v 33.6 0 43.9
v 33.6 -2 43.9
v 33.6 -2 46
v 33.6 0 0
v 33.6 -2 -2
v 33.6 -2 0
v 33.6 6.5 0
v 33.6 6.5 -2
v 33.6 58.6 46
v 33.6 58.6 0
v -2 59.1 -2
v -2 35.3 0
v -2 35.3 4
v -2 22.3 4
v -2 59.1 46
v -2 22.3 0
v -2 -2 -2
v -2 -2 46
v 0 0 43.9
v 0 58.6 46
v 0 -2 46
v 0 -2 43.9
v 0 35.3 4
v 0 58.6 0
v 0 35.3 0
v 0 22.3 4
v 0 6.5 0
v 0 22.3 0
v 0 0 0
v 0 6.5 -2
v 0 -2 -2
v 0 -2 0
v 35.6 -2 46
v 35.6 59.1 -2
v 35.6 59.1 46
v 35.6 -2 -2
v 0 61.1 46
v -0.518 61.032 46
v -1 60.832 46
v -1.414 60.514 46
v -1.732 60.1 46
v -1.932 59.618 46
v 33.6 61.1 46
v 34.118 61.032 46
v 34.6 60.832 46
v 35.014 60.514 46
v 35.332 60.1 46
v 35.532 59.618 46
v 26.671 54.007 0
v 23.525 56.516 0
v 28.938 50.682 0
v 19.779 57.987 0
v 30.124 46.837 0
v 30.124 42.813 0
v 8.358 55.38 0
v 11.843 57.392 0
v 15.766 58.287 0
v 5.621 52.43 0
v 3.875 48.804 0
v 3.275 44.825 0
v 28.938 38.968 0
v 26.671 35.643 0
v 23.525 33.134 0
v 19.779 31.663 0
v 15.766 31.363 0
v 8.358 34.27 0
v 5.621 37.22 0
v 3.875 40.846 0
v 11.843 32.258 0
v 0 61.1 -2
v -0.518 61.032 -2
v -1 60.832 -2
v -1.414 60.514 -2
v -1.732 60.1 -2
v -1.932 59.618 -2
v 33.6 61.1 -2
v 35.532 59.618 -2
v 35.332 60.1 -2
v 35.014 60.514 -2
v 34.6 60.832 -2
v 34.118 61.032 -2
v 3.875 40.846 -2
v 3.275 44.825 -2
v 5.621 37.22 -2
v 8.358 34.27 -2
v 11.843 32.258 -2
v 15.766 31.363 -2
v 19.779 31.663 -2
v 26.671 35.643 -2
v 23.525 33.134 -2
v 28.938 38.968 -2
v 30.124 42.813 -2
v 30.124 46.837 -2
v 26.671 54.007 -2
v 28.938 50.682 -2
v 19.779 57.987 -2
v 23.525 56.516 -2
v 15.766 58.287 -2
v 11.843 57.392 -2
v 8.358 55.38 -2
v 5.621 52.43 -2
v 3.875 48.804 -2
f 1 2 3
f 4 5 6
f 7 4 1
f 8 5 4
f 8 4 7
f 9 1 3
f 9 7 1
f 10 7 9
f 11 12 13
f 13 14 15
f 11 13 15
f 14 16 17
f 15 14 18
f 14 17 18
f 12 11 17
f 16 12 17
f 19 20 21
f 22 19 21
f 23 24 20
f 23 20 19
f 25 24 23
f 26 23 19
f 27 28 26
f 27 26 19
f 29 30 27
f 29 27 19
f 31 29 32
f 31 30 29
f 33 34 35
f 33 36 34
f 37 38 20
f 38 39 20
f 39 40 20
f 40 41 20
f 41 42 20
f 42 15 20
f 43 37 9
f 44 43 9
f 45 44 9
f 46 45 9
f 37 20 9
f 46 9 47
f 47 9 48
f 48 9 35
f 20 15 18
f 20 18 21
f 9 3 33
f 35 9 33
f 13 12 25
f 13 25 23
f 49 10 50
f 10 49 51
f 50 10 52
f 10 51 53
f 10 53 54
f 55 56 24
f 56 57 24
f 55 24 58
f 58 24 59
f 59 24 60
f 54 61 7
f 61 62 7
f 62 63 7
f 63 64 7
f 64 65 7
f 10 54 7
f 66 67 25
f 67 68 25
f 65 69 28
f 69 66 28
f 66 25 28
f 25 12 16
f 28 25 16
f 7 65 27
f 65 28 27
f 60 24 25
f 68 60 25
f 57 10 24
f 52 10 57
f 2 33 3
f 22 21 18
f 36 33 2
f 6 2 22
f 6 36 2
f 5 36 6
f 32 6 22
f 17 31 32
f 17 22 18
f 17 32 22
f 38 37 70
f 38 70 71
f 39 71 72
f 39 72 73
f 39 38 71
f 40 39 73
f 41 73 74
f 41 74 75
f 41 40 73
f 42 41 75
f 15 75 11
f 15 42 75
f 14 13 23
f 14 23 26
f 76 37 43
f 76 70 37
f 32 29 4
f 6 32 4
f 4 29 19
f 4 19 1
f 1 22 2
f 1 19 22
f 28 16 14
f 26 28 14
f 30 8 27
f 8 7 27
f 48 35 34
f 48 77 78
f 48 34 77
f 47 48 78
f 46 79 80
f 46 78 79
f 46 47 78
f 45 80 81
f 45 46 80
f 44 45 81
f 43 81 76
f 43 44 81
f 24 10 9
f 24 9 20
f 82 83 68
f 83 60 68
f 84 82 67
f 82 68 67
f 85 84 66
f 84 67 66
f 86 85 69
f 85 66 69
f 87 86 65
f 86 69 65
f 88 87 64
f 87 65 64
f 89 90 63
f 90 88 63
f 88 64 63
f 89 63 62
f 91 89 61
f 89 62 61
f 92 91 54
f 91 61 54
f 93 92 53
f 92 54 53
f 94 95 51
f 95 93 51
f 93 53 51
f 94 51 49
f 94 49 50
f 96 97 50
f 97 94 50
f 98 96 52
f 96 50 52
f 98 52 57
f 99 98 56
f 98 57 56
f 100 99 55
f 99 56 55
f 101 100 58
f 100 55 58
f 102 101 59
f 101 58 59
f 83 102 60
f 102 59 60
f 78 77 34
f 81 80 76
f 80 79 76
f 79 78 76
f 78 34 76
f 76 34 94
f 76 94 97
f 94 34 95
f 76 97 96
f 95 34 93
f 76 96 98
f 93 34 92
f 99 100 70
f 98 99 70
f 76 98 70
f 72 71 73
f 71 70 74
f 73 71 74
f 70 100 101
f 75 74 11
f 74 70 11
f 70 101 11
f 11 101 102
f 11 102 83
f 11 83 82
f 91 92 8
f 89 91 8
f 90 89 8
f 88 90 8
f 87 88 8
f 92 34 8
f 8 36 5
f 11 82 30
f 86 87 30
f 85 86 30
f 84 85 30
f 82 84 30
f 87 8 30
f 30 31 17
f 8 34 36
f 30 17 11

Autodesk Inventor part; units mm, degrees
ref_plane "YZ Plane" through (0, 0, 0) normal (1, 0, 0) x (0, 1, 0)
ref_plane "XZ Plane" through (0, 0, 0) normal (0, 1, 0) x (-1, 0, 0)
ref_plane "XY Plane" through (0, 0, 0) normal (0, 0, 1) x (1, 0, 0)
sketch "Sketch3" plane through (0, 0, 0) normal (0, 0, 1) x (1, 0, 0)
  line L0 (0, 0) -> (33.6, 0)
  line L1 (33.6, 0) -> (33.6, 58.6)
  line L2 (33.6, 58.6) -> (0, 58.6)
  line L3 (0, 58.6) -> (0, 0)
  line L4 (-2, 60.6) -> (35.6, 60.6)
  line L5 (35.6, 60.6) -> (35.6, -2)
  line L6 (35.6, -2) -> (-2, -2)
  line L7 (-2, -2) -> (-2, 60.6)
  dimension "d36" = 33.6
  dimension "d37" = 58.6
  dimension "d38" = 2
extrude "Extrusion3" add sketch "Sketch3" along normal blind 46
sketch "Sketch4" plane through (0, 0, 0) normal (0, 0, -1) x (-1, 0, 0)
  circle A0 centre (-16.775, 44.825) radius 13.5
  line L0 (0, 58.6) -> (-33.6, 58.6) projected
  line L1 (0, 0) -> (0, 58.6) projected
  line L2 (-33.6, 58.6) -> (-33.6, 0) projected
  line L3 (-33.6, 6.5) -> (0, 6.5)
  line L4 (0, 0) -> (0, 58.6) projected
  line L5 (-33.6, 0) -> (0, 0) projected
  line L6 (-33.6, 0) -> (0, 0) projected
  line L7 (-33.6, 6.5) -> (0, 6.5)
  line L8 (0, 6.5) -> (0, 0)
  line L9 (0, 0) -> (-33.6, 0)
  line L10 (-33.6, 0) -> (-33.6, 6.5)
  line L11 (-35.6, 60.6) -> (2, 60.6) projected
  line L12 (2, 60.6) -> (2, -2) projected
  line L13 (-35.6, 60.6) -> (2, 60.6)
  line L14 (2, 60.6) -> (2, -2)
  line L15 (2, -2) -> (-35.6, -2)
  line L16 (-35.6, -2) -> (-35.6, 60.6)
  line L17 (-33.6, 58.6) -> (-33.6, 0) projected
  line L18 (-33.6, 0) -> (-33.6, -2)
  line L19 (0, 0) -> (0, -2)
  line L20 (2, -2) -> (-35.6, -2) projected
  point P0 (0, 6.5)
  dimension "d41" = 27
  dimension "d42" = 13.775
  dimension "d43" = 16.775
  dimension "d44" = 6.5
extrude "Extrusion4" add sketch "Sketch4" along normal blind 2 contours L1 L3 L2 L0 | L0 L2 L18 L15 L16 L11 L12 L19 L1
sketch "Sketch5" plane through (-2, 60.6, 46) normal (0, 1, 0) x (1, 0, 0)
  line L0 (0, 0) -> (37.6, 0) projected
  line L1 (37.6, 48) -> (37.6, 0) projected
  line L2 (0, 0) -> (37.6, 0)
  line L3 (37.6, 0) -> (37.6, 48)
  line L4 (37.6, 48) -> (0, 48)
  line L5 (0, 48) -> (0, 0)
  point P0 (2, 46)
extrude "Extrusion5" add sketch "Sketch5" along normal blind 0.5
sketch "Sketch6" plane through (0, 0, 46) normal (0, 0, 1) x (1, 0, 0)
  line L0 (-2, -2) -> (35.6, -2)
  line L1 (35.6, -2) -> (35.6, 6.3)
  line L2 (35.6, 6.3) -> (-2, 6.3)
  line L3 (-2, 6.3) -> (-2, -2)
  line L4 (0, 6.5) -> (0, -2) projected
  line L5 (0, 6.3) -> (0, -2)
  line L6 (35.6, -2) -> (33.6, -2) projected
  line L7 (33.6, 6.3) -> (33.6, -2)
  point P0 (0, 0)
  dimension "d56" = 8.3
extrude "Extrusion6" cut sketch "Sketch6" against normal blind 2.1 contours L4 L2 L7 L0
sketch "Sketch7" plane through (-2, -2, -2) normal (-1, 0, 0) x (0, 0, 1)
  line L0 (0, 37.3) -> (6, 37.3)
  line L1 (0, 24.3) -> (6, 24.3)
  line L2 (6, 37.3) -> (6, 24.3)
  line L3 (2, 33.325) -> (2, 60.325) projected
  line L4 (48, 0) -> (0, 0) projected
  line L5 (2, 37.3) -> (2, 24.3)
  line L6 (0, 37.3) -> (0, 24.3)
  line L7 (0, 33.325) -> (0, 60.325) projected
  point P0 (2, 2)
  point P1 (3, 24.3)
  point P2 (2, 37.3)
  dimension "d59" = 6
  dimension "d60" = 13
  dimension "d61" = 24.3
extrude "Extrusion7" cut sketch "Sketch7" against normal up to surface (2 mm away) contours L0 L2 L1 L5 L3
fillet "Fillet3" radius 2 1 edges at (35.6, 61.1, 22)
fillet "Fillet4" radius 2 1 edges at (-2, 61.1, 22)
properties part number "Base_Demo_1"
